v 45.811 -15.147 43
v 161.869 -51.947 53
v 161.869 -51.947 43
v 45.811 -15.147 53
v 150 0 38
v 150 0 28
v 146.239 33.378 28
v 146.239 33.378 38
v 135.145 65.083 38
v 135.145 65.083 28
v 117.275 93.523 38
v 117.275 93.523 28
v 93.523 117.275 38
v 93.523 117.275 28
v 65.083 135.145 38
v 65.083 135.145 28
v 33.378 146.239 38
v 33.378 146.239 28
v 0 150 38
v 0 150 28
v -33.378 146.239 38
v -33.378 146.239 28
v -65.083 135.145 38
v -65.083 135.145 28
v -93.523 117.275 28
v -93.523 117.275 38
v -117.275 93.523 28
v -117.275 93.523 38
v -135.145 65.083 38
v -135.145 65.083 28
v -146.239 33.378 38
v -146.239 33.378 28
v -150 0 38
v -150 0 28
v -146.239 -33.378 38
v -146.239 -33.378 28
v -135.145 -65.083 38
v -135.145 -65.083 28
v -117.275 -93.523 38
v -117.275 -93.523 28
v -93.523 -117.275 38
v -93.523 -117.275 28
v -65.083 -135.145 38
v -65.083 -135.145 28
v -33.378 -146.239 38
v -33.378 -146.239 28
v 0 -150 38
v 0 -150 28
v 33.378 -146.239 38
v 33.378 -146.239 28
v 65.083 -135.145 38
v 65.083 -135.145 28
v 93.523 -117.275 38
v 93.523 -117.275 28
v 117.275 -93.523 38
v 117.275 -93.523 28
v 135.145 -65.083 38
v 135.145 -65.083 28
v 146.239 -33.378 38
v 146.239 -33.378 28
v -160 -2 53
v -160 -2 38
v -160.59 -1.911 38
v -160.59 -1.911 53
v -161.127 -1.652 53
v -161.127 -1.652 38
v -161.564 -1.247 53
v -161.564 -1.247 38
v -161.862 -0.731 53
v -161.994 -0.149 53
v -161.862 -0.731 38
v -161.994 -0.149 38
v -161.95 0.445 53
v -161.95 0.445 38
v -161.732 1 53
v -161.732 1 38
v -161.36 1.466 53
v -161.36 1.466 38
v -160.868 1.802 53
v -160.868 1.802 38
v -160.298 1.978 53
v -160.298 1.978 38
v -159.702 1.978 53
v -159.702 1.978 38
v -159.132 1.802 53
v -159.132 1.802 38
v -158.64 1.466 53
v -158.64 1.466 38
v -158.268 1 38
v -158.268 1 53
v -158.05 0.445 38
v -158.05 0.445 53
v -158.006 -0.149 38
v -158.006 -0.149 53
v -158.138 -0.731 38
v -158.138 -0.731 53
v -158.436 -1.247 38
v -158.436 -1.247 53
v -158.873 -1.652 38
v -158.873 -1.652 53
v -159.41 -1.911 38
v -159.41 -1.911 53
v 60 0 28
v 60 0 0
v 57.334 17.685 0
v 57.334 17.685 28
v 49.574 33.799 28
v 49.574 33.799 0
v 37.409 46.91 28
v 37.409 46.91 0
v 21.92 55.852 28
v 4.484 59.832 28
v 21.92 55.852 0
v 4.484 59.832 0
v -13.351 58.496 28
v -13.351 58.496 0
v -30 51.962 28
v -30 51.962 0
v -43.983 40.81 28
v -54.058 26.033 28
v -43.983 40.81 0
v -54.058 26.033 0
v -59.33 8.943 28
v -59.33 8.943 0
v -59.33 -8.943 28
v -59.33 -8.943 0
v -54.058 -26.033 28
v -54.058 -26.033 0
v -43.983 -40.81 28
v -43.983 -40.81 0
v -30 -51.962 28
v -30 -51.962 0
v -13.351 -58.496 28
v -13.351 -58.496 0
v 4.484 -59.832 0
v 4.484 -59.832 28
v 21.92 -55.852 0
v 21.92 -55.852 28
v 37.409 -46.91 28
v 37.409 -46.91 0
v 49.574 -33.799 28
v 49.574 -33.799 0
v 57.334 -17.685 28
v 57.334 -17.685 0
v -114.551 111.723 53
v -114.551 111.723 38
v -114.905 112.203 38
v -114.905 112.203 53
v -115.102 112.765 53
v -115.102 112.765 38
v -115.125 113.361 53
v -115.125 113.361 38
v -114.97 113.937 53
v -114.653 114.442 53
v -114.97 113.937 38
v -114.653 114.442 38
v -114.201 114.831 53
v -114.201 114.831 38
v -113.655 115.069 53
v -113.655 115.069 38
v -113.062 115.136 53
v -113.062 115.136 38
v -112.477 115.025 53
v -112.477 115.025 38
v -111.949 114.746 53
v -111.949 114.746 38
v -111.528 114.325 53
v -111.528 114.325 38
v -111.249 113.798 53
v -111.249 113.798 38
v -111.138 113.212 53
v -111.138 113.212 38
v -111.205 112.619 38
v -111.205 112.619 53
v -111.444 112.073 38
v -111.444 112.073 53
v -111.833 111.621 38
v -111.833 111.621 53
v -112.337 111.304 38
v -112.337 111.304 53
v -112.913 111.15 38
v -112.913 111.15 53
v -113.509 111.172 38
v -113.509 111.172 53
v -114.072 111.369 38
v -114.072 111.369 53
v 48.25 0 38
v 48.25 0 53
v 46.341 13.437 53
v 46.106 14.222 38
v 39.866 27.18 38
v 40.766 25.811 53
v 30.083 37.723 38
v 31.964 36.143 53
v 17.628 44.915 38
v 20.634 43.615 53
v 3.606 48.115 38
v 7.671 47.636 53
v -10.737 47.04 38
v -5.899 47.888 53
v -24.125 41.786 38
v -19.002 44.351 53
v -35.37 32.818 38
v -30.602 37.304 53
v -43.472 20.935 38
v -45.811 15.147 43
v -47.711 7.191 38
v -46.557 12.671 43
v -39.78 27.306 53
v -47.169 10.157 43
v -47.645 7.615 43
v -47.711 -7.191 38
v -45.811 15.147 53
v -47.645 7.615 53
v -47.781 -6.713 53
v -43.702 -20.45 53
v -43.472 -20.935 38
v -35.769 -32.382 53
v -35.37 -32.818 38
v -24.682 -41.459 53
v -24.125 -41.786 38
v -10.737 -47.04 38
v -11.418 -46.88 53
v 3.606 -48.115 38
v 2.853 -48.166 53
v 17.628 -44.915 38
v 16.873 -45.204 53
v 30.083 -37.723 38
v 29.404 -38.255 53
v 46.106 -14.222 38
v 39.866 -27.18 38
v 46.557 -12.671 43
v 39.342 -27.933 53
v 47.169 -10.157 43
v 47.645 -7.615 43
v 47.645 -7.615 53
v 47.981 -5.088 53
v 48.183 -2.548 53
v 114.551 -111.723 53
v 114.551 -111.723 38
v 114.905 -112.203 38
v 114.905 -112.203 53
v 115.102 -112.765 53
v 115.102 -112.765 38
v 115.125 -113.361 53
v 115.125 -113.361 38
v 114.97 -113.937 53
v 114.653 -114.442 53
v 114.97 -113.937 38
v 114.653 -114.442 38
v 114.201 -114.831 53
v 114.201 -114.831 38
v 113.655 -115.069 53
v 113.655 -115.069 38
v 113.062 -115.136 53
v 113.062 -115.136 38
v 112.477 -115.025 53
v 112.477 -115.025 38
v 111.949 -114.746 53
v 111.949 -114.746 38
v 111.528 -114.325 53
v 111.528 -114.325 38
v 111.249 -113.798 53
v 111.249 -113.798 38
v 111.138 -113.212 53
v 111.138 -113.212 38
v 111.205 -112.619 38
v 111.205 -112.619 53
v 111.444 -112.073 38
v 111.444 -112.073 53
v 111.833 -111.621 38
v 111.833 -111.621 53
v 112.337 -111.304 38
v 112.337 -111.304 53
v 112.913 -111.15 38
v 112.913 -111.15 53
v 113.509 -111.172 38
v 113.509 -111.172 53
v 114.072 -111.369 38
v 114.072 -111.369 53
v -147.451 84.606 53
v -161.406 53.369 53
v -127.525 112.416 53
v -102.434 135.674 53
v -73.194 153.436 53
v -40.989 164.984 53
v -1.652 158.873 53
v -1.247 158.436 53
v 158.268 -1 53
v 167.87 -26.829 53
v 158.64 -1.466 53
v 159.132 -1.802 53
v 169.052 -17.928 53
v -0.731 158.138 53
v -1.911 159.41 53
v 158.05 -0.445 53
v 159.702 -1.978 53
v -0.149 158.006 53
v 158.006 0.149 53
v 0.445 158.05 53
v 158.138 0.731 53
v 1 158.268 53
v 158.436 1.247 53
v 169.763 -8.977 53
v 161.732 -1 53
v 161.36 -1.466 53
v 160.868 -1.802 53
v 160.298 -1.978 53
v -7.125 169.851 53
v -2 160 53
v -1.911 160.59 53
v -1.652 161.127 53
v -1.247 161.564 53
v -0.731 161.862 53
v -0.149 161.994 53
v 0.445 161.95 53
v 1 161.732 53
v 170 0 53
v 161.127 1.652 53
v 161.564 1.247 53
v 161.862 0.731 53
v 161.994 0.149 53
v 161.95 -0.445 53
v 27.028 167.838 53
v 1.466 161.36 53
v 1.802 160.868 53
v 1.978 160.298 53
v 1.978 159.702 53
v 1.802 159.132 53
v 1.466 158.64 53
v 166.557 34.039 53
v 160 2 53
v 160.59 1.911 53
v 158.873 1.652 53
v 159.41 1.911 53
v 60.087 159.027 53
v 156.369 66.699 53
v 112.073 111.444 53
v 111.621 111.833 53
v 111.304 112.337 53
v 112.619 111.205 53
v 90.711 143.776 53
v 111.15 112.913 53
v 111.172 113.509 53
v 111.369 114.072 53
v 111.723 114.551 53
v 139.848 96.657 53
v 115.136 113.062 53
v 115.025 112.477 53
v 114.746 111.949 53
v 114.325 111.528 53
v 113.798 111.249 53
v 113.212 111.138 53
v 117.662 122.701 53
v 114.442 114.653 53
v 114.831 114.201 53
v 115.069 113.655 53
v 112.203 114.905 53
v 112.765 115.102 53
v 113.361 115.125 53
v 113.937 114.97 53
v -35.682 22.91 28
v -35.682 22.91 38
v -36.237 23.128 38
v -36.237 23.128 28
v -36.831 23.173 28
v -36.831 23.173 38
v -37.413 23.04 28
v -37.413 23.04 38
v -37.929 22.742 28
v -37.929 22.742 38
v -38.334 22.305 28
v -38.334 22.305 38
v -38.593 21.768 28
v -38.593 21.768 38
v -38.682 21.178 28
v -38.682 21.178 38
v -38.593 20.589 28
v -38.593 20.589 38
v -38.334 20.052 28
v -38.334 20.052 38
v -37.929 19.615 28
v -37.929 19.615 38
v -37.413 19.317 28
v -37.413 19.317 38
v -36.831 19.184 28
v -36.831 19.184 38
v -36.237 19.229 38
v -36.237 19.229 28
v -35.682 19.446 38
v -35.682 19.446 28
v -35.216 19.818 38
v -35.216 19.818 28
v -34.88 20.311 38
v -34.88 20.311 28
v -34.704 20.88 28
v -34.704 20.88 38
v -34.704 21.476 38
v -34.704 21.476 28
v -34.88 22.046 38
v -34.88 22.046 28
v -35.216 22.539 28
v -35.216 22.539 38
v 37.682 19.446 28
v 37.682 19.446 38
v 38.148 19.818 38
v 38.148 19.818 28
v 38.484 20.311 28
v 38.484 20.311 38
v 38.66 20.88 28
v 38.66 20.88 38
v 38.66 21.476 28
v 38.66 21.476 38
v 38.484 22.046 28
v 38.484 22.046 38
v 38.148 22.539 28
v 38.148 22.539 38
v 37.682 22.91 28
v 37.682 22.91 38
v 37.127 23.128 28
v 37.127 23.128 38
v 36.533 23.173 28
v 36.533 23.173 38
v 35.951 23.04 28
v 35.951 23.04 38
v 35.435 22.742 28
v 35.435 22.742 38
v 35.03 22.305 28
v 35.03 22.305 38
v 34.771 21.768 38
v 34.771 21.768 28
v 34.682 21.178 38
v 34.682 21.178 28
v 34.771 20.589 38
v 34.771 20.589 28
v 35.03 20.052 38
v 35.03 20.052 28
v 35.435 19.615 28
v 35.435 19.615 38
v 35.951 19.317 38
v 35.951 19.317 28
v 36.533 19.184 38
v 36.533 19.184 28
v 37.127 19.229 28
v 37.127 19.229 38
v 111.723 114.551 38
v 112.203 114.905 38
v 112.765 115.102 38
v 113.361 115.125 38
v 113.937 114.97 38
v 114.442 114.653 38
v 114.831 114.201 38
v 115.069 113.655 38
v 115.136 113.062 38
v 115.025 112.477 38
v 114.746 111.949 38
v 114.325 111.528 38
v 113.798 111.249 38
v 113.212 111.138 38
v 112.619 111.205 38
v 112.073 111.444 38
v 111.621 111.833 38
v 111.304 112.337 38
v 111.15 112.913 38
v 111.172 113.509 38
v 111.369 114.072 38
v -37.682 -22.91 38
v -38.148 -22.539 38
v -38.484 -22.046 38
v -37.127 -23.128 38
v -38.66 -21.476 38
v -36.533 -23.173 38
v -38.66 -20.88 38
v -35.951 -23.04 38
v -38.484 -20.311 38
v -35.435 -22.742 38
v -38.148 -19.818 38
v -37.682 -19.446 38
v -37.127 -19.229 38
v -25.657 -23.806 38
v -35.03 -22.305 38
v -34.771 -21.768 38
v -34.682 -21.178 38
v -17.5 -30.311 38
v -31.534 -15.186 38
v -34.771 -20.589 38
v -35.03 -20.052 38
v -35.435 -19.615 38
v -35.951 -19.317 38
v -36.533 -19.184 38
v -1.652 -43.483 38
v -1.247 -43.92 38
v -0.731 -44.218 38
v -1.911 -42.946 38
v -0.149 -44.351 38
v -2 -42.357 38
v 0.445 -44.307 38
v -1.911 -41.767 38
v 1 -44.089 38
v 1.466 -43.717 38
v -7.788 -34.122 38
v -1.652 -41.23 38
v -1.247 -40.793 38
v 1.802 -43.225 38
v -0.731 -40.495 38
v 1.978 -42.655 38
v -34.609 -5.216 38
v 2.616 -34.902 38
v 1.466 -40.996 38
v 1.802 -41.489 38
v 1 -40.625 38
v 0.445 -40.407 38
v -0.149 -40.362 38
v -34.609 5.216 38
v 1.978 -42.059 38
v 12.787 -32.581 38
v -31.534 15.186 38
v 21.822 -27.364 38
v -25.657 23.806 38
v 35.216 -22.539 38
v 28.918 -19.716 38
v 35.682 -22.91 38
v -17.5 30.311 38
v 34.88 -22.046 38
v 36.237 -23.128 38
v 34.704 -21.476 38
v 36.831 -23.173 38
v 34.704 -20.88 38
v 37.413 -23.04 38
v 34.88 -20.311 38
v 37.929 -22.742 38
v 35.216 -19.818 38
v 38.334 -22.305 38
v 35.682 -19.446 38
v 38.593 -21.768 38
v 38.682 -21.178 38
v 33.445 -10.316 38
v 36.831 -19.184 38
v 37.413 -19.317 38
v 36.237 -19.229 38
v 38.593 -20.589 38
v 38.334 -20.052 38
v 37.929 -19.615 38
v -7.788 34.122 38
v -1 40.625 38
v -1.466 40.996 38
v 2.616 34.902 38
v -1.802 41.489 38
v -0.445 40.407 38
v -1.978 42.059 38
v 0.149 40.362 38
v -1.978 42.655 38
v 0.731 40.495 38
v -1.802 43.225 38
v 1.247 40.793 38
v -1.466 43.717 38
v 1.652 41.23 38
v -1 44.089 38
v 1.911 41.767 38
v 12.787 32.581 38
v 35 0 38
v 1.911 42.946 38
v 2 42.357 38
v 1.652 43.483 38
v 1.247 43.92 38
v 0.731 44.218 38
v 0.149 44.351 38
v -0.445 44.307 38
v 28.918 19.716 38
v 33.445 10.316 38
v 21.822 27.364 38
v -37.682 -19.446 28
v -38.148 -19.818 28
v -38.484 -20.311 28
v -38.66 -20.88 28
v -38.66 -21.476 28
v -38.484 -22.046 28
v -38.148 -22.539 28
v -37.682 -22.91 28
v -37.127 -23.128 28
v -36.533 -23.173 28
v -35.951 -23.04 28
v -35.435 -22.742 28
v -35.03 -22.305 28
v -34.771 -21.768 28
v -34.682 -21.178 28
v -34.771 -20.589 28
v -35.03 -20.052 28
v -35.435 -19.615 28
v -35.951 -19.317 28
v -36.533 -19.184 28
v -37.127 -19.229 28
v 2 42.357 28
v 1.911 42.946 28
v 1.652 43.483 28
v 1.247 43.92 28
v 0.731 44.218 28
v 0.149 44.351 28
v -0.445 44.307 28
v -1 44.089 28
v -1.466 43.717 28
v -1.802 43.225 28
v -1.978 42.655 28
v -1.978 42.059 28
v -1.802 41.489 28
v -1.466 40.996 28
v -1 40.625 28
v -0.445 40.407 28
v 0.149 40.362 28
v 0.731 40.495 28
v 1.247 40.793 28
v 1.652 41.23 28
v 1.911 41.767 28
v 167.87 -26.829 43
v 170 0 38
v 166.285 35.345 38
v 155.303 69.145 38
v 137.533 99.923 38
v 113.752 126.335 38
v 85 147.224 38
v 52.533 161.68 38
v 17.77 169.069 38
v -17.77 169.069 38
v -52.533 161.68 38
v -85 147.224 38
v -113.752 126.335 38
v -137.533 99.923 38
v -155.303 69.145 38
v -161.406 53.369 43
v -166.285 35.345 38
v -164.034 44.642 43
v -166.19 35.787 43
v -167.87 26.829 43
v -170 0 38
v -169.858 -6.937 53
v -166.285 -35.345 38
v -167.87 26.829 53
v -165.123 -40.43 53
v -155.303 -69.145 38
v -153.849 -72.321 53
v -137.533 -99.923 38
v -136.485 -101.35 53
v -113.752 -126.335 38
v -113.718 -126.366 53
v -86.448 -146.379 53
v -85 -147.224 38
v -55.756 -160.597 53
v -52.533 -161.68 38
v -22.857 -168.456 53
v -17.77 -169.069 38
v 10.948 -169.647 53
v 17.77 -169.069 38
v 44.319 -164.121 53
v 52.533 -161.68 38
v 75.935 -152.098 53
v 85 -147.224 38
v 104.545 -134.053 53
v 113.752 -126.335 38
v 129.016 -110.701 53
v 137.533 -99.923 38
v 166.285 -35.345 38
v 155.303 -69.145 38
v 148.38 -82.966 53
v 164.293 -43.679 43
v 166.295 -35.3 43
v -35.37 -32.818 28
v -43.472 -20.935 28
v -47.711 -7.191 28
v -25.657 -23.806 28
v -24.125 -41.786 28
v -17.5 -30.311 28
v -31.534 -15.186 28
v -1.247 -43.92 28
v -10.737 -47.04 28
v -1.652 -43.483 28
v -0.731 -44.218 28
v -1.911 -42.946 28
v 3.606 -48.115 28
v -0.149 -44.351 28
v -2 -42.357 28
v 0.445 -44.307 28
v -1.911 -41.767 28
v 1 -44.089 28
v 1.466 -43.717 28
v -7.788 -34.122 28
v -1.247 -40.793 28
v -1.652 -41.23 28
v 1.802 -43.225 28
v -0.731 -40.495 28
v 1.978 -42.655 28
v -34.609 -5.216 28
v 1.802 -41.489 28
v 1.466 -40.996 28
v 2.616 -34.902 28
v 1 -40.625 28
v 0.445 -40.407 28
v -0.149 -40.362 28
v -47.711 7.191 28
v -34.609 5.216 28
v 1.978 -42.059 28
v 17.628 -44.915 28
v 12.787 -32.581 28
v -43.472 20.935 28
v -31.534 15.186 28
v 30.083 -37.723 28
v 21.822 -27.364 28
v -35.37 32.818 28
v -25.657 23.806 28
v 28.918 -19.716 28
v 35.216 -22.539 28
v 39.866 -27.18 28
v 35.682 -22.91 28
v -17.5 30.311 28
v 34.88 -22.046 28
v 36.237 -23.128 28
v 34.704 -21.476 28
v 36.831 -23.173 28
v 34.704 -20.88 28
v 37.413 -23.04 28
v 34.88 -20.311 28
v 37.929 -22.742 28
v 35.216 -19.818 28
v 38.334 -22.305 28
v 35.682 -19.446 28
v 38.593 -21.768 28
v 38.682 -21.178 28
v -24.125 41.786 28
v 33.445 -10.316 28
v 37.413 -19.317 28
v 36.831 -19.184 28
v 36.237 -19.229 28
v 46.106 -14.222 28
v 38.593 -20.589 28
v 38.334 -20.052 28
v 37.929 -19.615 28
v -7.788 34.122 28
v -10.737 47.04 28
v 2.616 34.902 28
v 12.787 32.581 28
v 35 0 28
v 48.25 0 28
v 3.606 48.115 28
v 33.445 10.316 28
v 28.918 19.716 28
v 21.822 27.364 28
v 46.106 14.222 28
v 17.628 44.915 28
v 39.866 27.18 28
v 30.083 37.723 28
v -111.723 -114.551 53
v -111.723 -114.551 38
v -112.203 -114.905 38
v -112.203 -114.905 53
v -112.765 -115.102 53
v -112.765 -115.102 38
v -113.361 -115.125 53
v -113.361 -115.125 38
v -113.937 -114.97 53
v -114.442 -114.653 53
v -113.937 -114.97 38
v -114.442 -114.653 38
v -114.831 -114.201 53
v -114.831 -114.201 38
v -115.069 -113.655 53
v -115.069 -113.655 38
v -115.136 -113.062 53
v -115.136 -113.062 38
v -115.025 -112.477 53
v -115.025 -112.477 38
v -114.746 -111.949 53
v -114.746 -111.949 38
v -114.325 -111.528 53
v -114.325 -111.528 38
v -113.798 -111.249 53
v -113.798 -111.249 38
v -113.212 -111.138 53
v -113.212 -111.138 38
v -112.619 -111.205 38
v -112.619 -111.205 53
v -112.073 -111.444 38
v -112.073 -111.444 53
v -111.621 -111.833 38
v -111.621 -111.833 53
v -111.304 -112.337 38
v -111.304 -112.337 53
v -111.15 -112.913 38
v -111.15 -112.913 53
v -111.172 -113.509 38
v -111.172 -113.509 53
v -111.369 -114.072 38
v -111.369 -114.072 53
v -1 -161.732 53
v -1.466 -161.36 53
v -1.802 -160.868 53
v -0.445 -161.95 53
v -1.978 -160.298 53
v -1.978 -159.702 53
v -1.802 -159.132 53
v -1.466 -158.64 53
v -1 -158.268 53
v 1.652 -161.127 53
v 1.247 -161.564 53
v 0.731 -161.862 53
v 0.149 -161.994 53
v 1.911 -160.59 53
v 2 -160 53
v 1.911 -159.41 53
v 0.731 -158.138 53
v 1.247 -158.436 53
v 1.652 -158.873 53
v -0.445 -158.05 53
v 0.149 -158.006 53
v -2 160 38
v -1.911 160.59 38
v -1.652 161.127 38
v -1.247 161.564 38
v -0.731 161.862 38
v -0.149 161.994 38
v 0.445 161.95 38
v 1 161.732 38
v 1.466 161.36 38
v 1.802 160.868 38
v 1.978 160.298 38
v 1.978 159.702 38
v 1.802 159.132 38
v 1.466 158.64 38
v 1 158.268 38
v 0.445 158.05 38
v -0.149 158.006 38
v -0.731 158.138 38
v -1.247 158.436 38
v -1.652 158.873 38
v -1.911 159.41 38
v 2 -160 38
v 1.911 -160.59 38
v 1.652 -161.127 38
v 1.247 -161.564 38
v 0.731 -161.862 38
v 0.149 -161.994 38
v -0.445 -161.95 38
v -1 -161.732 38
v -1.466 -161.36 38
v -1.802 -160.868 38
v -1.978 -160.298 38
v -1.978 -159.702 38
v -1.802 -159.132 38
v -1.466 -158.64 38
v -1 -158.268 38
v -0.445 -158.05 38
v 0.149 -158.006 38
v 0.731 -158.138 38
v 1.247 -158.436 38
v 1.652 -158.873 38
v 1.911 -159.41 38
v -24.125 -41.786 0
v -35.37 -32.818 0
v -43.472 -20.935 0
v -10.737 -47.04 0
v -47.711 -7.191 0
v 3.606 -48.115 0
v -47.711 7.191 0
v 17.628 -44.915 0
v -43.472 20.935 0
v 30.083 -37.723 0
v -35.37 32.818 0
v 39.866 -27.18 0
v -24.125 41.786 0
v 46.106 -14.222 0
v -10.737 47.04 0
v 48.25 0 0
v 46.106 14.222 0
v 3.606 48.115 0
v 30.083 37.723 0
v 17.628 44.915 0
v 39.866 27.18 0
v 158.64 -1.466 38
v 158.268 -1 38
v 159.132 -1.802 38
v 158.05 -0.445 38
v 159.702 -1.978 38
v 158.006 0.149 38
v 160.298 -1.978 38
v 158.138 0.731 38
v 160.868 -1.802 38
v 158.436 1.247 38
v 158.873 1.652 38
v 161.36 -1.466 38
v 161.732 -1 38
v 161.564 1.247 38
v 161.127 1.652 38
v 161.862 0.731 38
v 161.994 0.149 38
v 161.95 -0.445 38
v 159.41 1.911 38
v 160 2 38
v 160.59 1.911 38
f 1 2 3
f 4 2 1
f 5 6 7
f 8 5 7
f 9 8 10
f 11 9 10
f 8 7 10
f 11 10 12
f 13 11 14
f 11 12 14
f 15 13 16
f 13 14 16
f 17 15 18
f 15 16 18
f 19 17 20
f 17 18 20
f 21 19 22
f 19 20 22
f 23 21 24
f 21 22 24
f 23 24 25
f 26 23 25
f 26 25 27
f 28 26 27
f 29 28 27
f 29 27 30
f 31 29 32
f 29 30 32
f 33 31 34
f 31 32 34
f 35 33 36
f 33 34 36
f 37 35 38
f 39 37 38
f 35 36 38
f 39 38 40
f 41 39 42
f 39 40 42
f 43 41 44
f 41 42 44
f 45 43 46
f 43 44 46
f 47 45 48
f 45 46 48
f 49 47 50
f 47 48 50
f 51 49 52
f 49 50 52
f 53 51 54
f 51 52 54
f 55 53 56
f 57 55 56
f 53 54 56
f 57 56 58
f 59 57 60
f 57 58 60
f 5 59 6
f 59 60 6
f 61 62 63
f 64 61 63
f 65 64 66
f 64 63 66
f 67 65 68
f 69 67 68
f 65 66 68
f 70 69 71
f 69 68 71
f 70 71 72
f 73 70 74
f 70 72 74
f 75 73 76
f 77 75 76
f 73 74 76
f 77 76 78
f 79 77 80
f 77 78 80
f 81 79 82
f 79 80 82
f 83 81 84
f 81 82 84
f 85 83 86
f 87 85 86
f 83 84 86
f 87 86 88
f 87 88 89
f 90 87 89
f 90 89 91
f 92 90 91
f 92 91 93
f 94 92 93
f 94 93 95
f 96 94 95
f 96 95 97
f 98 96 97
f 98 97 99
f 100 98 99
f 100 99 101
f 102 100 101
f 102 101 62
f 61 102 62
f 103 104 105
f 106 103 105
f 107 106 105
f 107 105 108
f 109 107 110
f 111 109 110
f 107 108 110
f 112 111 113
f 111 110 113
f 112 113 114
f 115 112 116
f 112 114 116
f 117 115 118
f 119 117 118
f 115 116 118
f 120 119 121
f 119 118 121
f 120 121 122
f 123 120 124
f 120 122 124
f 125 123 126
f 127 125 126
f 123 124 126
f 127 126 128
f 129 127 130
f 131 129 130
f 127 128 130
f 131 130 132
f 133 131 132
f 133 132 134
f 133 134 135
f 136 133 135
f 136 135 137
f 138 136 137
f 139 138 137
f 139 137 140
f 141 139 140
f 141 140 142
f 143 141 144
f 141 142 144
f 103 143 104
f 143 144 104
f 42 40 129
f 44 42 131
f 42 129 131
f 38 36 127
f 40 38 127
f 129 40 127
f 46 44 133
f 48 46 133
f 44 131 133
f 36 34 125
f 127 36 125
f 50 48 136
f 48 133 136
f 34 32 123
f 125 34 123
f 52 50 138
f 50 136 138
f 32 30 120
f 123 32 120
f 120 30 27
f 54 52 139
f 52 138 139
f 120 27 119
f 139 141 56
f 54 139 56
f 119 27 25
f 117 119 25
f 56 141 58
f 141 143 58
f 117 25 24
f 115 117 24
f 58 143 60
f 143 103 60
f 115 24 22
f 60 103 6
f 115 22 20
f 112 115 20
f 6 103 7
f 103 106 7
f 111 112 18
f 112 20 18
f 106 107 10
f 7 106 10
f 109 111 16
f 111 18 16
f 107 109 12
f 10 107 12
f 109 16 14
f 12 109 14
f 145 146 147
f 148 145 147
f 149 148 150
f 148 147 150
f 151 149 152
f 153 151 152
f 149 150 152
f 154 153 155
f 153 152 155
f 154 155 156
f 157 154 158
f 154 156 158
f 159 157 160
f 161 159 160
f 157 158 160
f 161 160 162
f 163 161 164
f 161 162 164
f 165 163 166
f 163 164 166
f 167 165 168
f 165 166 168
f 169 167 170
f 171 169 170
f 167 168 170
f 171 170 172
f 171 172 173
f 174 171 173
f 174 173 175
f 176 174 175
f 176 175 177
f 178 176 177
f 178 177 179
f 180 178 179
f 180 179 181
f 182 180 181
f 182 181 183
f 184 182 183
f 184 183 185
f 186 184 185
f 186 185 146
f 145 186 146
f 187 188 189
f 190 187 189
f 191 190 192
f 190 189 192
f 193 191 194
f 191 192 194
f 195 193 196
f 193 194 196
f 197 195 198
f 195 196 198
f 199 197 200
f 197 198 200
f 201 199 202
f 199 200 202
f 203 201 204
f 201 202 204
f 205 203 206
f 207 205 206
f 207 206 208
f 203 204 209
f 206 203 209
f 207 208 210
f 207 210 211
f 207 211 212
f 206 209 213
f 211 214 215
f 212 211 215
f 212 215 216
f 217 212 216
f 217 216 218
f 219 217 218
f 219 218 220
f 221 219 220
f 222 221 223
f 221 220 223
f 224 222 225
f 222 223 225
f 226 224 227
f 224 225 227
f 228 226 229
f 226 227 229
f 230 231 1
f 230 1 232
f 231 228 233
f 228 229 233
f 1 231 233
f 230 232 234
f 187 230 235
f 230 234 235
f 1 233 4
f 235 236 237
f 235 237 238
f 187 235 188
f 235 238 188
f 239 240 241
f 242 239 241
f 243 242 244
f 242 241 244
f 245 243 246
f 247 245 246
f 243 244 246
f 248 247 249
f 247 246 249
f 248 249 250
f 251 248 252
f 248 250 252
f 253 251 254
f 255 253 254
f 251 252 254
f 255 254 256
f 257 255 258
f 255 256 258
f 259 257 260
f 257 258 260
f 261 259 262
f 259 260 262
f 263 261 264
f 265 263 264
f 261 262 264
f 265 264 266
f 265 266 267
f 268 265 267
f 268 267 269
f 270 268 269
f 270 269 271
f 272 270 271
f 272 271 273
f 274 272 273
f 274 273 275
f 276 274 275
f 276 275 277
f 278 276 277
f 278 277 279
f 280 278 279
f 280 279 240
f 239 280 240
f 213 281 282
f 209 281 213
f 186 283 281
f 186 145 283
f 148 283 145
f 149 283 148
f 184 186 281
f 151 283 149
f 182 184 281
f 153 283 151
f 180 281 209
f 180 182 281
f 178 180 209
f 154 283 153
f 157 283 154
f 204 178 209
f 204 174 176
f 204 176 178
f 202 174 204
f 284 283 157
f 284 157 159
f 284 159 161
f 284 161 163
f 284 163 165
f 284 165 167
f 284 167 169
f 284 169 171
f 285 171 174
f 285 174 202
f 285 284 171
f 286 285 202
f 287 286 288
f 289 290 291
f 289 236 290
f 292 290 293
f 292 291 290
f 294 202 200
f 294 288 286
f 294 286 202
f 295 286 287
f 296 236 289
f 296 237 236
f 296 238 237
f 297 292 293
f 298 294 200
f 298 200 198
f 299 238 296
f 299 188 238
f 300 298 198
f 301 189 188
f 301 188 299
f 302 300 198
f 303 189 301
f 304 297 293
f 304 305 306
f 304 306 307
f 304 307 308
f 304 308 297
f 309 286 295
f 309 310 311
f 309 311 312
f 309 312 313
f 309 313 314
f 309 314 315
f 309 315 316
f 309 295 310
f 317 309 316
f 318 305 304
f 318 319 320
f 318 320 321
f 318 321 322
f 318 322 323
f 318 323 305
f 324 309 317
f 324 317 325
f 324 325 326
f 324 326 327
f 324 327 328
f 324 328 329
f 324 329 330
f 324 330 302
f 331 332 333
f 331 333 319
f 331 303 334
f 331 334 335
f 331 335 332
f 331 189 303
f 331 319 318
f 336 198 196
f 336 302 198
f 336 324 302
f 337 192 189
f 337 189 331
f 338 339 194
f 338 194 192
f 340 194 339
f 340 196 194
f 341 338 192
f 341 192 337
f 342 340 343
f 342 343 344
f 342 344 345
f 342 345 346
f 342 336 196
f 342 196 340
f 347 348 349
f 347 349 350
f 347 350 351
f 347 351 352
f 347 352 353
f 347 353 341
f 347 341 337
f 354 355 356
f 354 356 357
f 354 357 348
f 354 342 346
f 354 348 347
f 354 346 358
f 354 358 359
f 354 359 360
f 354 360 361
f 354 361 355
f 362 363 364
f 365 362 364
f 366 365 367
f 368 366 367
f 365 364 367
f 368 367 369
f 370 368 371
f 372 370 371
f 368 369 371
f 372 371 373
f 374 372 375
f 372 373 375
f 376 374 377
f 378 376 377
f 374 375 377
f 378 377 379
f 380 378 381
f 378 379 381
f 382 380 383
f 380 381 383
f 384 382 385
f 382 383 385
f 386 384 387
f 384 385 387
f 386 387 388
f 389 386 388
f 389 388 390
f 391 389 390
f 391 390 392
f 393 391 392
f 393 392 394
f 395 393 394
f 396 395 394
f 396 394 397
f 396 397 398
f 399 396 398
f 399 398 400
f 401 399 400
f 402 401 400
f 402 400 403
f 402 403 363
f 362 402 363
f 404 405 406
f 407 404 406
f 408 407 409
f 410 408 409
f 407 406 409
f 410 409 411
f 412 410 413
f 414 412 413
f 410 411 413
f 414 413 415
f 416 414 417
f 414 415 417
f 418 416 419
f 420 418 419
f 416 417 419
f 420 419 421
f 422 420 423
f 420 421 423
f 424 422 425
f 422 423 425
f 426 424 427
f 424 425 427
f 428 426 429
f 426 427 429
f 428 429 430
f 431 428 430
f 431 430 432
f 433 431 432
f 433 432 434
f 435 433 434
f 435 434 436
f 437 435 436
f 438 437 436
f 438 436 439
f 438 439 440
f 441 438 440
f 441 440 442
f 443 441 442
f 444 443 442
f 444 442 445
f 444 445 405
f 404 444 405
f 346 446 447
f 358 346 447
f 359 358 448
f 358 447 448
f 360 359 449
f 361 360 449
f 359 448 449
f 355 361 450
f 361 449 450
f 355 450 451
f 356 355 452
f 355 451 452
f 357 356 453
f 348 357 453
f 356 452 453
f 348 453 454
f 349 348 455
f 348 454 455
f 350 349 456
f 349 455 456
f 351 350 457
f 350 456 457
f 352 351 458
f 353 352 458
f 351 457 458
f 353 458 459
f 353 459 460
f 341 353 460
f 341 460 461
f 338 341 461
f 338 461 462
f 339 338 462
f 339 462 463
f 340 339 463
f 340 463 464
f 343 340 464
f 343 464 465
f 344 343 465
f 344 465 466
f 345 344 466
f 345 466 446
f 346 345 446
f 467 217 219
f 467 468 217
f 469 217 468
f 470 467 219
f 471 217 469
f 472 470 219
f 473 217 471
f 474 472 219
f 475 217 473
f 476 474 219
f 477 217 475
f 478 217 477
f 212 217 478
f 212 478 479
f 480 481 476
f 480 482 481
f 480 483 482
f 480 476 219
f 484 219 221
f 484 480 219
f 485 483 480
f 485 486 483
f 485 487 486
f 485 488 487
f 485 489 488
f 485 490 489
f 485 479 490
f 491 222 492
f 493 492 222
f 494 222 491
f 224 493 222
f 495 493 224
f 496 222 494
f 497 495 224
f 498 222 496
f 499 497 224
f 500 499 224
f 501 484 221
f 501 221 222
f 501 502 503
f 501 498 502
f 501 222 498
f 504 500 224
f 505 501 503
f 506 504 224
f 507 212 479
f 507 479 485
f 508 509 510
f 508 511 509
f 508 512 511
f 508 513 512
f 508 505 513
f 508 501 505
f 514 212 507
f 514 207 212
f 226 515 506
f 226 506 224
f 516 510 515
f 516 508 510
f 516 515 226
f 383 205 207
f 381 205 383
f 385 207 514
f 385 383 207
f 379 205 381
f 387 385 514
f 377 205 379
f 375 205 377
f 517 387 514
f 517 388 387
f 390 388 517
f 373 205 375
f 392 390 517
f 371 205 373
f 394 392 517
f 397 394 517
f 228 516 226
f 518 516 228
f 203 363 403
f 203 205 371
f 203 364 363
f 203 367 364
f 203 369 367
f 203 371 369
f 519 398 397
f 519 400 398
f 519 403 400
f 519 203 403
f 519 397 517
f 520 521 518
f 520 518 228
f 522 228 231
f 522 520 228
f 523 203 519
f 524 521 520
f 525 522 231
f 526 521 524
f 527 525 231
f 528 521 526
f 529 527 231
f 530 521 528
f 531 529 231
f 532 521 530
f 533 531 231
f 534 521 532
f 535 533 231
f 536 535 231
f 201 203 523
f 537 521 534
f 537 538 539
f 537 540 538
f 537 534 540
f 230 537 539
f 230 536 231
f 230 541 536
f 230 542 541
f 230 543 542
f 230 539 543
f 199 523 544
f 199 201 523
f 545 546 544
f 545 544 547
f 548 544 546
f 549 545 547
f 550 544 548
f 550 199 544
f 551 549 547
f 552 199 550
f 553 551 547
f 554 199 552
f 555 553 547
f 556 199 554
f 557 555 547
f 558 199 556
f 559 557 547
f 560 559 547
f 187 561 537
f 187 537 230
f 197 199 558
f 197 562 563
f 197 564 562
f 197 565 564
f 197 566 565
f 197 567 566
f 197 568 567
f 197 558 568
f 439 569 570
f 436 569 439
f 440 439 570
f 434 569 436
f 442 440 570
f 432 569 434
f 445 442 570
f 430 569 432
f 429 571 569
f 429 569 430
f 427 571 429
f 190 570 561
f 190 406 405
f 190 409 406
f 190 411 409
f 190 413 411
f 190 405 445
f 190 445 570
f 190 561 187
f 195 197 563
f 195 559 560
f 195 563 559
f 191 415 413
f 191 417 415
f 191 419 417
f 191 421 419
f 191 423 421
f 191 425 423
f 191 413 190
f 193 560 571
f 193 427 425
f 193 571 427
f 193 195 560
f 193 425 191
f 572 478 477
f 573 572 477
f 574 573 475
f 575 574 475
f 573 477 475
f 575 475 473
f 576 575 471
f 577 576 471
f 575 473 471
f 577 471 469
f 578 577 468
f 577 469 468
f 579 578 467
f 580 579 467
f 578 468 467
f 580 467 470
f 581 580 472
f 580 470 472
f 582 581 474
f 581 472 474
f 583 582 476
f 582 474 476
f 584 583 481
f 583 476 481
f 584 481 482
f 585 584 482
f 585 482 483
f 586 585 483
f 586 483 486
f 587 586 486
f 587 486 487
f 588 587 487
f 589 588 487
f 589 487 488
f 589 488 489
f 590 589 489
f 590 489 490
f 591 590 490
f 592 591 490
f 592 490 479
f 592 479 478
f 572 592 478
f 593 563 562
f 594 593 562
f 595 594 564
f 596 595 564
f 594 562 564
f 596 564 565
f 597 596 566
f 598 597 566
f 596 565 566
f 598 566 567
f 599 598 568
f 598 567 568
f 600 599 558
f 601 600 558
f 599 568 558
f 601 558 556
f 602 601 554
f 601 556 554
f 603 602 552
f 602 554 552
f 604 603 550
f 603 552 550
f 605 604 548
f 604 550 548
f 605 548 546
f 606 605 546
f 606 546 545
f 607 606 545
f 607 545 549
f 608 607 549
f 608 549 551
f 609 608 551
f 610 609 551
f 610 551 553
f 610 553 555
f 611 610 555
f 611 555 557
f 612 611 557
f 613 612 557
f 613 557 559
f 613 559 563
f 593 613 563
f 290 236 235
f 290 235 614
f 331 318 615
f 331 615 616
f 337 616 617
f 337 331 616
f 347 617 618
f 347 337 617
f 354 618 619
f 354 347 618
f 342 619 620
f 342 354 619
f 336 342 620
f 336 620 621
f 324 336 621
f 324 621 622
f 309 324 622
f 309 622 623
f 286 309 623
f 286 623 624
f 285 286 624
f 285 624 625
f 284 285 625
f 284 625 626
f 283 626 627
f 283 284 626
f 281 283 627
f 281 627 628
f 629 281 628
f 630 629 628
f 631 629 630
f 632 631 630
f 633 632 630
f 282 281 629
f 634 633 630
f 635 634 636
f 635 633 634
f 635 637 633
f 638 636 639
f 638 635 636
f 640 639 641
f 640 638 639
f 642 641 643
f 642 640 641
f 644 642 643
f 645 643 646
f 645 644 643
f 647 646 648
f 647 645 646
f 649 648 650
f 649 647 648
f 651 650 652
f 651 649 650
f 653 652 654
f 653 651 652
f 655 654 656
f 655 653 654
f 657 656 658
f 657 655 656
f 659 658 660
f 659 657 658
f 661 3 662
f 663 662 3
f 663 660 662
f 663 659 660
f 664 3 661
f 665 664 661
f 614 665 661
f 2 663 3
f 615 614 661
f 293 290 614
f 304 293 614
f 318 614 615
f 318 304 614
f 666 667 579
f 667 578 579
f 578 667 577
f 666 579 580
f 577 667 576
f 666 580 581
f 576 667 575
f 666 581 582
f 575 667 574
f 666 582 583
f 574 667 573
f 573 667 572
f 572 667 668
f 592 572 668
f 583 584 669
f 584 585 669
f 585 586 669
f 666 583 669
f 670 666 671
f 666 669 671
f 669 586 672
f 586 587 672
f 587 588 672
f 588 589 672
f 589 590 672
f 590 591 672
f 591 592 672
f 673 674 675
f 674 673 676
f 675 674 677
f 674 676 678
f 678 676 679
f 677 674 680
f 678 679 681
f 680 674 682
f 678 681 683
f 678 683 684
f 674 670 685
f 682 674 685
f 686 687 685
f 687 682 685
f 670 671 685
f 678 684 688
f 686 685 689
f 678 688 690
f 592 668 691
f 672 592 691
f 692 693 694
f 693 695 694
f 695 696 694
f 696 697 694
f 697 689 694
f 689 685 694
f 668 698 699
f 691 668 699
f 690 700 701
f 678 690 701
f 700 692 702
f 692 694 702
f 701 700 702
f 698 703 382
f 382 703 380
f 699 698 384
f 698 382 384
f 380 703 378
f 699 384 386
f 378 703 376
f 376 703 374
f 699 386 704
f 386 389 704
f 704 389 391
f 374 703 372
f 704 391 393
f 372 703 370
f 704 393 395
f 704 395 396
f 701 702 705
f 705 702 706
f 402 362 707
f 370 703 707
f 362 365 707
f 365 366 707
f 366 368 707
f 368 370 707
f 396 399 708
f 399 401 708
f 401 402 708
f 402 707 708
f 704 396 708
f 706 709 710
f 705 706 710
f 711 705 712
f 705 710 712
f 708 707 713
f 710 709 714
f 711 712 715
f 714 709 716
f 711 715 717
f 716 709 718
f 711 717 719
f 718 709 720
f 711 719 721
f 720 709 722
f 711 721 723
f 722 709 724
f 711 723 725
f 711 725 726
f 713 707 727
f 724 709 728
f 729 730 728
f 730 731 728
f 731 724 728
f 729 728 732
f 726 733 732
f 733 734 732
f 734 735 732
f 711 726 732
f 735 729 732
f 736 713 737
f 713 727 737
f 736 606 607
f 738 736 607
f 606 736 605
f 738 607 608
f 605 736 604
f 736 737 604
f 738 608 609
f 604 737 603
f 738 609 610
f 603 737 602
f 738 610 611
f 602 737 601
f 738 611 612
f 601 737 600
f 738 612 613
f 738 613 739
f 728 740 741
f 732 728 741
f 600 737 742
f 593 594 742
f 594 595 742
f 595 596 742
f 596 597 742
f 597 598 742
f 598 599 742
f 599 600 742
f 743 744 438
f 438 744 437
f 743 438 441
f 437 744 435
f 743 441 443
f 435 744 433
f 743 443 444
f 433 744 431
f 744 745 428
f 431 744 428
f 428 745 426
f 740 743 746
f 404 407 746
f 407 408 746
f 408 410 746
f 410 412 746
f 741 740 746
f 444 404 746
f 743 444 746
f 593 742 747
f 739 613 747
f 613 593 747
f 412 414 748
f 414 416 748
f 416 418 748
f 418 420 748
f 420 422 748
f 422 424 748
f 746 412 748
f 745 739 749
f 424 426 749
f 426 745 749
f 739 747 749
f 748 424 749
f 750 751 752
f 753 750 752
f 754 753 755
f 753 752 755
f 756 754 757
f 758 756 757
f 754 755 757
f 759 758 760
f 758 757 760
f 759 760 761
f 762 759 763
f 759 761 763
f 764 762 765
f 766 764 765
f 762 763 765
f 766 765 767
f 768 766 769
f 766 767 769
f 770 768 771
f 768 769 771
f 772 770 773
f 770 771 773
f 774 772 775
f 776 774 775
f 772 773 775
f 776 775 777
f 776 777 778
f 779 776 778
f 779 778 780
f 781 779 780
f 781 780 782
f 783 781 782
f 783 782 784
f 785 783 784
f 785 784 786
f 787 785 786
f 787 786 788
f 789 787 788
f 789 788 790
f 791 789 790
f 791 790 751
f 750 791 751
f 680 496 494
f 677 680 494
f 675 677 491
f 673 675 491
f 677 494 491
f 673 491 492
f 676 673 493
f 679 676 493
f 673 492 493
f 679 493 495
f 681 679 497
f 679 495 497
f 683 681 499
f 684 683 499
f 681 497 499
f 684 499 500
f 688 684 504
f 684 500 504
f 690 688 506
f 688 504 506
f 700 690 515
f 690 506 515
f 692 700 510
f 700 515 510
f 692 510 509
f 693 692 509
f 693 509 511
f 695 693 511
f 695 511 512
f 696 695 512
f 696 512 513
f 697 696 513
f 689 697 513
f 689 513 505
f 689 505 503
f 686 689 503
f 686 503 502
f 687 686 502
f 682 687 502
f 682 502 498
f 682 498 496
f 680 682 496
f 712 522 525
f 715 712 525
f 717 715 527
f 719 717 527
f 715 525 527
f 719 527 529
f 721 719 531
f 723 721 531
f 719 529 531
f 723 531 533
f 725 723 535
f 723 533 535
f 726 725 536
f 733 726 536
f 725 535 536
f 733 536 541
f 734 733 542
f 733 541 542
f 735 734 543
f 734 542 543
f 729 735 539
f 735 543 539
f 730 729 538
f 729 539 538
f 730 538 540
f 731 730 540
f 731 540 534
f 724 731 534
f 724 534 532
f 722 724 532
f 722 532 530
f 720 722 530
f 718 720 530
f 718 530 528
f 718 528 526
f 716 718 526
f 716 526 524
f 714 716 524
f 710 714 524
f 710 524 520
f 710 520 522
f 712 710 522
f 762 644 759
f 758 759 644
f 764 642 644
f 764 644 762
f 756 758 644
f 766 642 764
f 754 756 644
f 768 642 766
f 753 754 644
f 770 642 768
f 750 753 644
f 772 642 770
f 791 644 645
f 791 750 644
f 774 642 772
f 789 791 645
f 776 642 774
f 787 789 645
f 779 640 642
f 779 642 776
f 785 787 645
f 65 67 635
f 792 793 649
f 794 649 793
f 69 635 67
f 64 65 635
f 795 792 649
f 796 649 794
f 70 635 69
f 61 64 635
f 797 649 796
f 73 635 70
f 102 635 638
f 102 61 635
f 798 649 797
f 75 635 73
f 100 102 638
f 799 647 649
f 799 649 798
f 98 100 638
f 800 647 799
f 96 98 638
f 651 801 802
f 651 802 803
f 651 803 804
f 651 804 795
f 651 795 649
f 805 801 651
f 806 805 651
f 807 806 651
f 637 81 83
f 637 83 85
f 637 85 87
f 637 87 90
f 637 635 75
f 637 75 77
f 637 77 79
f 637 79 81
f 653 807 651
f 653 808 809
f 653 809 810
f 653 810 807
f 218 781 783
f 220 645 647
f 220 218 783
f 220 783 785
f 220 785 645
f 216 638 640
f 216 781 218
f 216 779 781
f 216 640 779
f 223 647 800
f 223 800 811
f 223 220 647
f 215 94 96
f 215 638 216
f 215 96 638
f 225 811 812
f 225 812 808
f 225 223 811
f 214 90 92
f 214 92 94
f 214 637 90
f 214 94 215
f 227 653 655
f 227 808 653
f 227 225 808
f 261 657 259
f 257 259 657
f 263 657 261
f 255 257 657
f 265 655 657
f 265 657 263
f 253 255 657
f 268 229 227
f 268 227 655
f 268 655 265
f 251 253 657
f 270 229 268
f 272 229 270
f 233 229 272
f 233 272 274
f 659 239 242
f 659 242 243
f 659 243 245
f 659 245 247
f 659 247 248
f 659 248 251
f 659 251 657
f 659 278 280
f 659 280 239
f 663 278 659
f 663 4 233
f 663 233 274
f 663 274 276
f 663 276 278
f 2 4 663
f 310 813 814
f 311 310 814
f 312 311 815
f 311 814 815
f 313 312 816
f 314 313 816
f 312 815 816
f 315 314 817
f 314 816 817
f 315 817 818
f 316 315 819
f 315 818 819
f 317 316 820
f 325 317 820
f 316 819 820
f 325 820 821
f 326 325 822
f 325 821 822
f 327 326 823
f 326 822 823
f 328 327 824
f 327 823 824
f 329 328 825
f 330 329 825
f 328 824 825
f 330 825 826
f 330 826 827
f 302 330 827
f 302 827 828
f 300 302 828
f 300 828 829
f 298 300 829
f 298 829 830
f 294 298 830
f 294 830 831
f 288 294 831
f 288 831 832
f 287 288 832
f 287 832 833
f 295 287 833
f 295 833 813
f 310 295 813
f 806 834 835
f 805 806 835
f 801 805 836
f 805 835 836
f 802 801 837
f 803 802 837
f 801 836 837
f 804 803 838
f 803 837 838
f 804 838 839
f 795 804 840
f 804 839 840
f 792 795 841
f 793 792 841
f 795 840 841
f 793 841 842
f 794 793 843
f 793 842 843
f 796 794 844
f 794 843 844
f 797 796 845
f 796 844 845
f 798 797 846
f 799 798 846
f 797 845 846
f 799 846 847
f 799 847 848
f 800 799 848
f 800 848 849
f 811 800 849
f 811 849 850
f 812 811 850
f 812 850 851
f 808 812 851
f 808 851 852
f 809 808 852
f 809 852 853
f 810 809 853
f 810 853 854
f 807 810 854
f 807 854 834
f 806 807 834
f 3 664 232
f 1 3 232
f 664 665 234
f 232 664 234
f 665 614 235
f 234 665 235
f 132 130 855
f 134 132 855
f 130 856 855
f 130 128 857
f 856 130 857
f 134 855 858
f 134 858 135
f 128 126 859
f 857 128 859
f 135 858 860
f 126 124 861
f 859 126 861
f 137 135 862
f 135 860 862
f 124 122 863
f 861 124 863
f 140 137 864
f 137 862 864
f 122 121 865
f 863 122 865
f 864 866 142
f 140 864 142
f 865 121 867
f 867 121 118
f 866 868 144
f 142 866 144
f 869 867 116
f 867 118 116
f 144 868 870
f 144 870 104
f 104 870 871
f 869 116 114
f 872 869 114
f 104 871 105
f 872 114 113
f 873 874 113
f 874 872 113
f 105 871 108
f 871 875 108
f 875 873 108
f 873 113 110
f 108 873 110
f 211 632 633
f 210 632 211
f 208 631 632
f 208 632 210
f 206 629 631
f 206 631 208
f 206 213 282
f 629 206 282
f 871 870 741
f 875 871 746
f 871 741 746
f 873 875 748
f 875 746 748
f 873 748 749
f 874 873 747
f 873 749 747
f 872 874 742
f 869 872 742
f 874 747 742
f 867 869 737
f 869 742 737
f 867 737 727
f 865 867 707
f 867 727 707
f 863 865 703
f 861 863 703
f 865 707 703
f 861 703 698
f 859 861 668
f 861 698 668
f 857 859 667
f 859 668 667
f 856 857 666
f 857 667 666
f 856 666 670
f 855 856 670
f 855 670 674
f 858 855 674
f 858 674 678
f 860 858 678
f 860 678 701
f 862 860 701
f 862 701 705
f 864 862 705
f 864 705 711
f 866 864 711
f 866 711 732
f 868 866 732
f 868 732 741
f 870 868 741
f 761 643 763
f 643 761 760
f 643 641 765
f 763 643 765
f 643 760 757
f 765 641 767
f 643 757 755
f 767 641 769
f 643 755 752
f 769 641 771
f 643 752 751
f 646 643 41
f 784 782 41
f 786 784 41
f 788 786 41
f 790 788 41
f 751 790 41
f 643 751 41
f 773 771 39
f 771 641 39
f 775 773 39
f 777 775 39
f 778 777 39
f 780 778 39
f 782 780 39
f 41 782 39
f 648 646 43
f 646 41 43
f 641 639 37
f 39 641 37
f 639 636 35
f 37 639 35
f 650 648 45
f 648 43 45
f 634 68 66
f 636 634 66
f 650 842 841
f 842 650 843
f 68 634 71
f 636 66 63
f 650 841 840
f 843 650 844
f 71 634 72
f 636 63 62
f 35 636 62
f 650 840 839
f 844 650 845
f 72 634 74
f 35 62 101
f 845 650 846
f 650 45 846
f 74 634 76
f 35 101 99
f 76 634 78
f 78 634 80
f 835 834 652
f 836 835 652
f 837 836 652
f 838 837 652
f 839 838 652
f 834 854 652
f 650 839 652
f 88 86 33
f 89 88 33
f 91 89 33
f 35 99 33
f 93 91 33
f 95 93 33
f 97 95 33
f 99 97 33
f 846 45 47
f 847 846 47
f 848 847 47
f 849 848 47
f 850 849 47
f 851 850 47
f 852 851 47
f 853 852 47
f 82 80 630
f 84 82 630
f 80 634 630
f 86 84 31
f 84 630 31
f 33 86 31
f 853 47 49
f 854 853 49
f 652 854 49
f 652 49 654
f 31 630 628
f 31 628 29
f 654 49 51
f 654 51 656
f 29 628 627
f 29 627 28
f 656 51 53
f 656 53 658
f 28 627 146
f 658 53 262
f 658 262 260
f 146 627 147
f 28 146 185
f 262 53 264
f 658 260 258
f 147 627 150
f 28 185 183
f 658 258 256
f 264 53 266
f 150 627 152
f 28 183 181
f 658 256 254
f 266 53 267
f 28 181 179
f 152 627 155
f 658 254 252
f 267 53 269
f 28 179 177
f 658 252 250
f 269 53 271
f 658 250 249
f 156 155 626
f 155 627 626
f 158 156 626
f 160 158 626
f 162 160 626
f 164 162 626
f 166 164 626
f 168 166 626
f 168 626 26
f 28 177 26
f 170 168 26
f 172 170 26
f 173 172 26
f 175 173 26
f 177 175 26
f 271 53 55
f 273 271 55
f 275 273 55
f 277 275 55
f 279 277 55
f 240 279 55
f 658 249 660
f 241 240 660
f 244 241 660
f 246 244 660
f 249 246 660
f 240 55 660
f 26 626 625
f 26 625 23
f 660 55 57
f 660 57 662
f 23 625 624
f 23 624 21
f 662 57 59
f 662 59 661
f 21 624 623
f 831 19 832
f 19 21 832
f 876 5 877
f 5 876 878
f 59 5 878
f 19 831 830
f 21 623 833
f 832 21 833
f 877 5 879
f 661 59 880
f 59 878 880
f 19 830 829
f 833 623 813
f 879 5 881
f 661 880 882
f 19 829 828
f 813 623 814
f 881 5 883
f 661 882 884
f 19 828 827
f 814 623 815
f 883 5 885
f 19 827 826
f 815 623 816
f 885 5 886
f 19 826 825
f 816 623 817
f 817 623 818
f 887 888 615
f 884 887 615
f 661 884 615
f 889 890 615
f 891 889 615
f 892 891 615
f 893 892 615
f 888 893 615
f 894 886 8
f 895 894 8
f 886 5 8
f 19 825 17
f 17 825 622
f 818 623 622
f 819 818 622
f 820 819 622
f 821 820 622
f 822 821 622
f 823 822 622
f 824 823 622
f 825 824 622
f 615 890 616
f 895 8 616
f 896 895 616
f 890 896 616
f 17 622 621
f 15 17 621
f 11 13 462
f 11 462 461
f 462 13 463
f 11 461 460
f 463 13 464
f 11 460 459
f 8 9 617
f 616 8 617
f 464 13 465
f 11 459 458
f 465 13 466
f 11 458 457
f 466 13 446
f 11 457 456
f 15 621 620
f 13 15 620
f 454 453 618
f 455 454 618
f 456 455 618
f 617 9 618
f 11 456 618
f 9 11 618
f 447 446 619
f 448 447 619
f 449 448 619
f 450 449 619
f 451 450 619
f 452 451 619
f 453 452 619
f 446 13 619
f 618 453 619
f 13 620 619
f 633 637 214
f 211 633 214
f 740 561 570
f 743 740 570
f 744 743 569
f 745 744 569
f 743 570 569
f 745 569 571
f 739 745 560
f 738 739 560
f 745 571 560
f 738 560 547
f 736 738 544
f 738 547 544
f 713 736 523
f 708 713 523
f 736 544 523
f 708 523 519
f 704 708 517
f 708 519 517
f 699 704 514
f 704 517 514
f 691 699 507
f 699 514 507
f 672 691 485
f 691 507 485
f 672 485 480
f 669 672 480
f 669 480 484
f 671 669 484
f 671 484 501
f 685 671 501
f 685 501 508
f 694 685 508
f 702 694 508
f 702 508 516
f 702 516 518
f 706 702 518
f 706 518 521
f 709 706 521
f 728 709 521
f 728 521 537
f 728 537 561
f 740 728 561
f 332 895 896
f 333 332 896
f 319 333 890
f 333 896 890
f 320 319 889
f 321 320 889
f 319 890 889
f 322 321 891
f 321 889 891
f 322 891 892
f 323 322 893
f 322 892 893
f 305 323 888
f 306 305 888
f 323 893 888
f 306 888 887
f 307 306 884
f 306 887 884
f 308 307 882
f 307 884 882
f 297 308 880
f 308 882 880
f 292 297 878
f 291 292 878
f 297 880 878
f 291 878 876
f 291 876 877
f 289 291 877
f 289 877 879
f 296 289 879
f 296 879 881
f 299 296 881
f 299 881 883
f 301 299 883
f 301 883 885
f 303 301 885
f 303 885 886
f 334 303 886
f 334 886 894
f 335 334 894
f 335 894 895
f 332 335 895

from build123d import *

# Parameters (mm, degrees)
SKETCH_1_R               = 60
EXTRUDE_1_DEPTH          = 28
SKETCH_2_R               = 48.25
CUT_EXTRUDE_1_DEPTH      = 90.353231615
SKETCH_4_R               = 150
EXTRUDE_3_DEPTH          = 10
SKETCH_5_R               = 35
CUT_EXTRUDE_2_DEPTH      = 216.50870052
SKETCH_6_R               = 2
CUT_EXTRUDE_3_DEPTH      = 216.50870052
PATTERN_CIRCULAR_1_COUNT = 6
EXTRUDE_START            = 15
SKETCH_7_R               = 170
SKETCH_7_R_2             = 48.25
EXTRUDE_4_DEPTH          = 15
SKETCH_9_R               = 2
CUT_EXTRUDE_4_DEPTH      = 244.40090386
PATTERN_CIRCULAR_2_COUNT = 8
CUT_EXTRUDE_5_DEPTH      = 10


with BuildPart() as part:
    # 草图1 → 凸台-拉伸1 (new body)
    with BuildSketch(Plane.XY):
        Circle(SKETCH_1_R)
    extrude(amount=EXTRUDE_1_DEPTH)

    # 草图2 → 切除-拉伸1 (cut, through all)
    with BuildSketch(Plane.XY.offset(28)):
        Circle(SKETCH_2_R)
    extrude(amount=-CUT_EXTRUDE_1_DEPTH, mode=Mode.SUBTRACT)

    # 草图4 → 凸台-拉伸3 (add)
    with BuildSketch(Plane.XY.offset(28)):
        Circle(SKETCH_4_R)
    extrude(amount=EXTRUDE_3_DEPTH)

    # 草图5 → 切除-拉伸2 (cut, through all)
    with BuildSketch(Plane.XY.offset(38)):
        Circle(SKETCH_5_R)
    extrude(amount=-CUT_EXTRUDE_2_DEPTH, mode=Mode.SUBTRACT)

    # 草图6 → 切除-拉伸3 (cut, through all)
    with BuildSketch(Plane.XY.offset(38)):
        with Locations((0, 42.356738024)):
            Circle(SKETCH_6_R)
    cut_extrude_3 = extrude(amount=-CUT_EXTRUDE_3_DEPTH, mode=Mode.SUBTRACT)

    # 阵列(圆周)1: 切除-拉伸3 ×6 about axis
    pattern_circular_1_axis = Axis((0, 0, 0), (0, 0, 1))
    for i in range(1, PATTERN_CIRCULAR_1_COUNT):
        add(cut_extrude_3.rotate(pattern_circular_1_axis, i * 360 / PATTERN_CIRCULAR_1_COUNT), mode=Mode.SUBTRACT)

    # 草图7 → 凸台-拉伸4 (add)
    with BuildSketch(Plane.XY.offset(38).offset(EXTRUDE_START)):
        Circle(SKETCH_7_R)
        Circle(SKETCH_7_R_2, mode=Mode.SUBTRACT)
    extrude(amount=-EXTRUDE_4_DEPTH)

    # 草图9 → 切除-拉伸4 (cut, through all)
    with BuildSketch(Plane(origin=(0, 0, 38), x_dir=(-1, 0, 0), z_dir=(0, 0, -1))):
        with Locations((0, 160)):
            Circle(SKETCH_9_R)
    cut_extrude_4 = extrude(amount=-CUT_EXTRUDE_4_DEPTH, mode=Mode.SUBTRACT)

    # 阵列(圆周)2: 切除-拉伸4 ×8 about axis
    pattern_circular_2_axis = Axis((0, 0, 0), (0, 0, 1))
    for i in range(1, PATTERN_CIRCULAR_2_COUNT):
        add(cut_extrude_4.rotate(pattern_circular_2_axis, i * 360 / PATTERN_CIRCULAR_2_COUNT), mode=Mode.SUBTRACT)

    # 草图11 → 切除-拉伸5 (cut)
    with BuildSketch(Plane.XY.offset(53)):
        with BuildLine():
            Line((47.645322741, -7.614835578), (167.869530902, -26.829472503))
            ThreePointArc((167.869530902, -26.829472503), (165.346802936, -39.502338652), (161.868807028, -51.946985586))
            Line((161.868807028, -51.946985586), (45.810704842, -15.147337122))
            ThreePointArc((45.810704842, -15.147337122), (46.879546902, -11.417993791), (47.645322741, -7.614835578))
        make_face()
        with BuildLine():
            Line((-45.810704842, 15.147337122), (-161.405592189, 53.368856183))
            ThreePointArc((-161.405592189, 53.368856183), (-165.171460589, 40.229200923), (-167.869530902, 26.829472503))
            Line((-167.869530902, 26.829472503), (-47.645322741, 7.614835578))
            ThreePointArc((-47.645322741, 7.614835578), (-46.879546902, 11.417993791), (-45.810704842, 15.147337122))
        make_face()
    extrude(amount=-CUT_EXTRUDE_5_DEPTH, mode=Mode.SUBTRACT)


solid = part.part
